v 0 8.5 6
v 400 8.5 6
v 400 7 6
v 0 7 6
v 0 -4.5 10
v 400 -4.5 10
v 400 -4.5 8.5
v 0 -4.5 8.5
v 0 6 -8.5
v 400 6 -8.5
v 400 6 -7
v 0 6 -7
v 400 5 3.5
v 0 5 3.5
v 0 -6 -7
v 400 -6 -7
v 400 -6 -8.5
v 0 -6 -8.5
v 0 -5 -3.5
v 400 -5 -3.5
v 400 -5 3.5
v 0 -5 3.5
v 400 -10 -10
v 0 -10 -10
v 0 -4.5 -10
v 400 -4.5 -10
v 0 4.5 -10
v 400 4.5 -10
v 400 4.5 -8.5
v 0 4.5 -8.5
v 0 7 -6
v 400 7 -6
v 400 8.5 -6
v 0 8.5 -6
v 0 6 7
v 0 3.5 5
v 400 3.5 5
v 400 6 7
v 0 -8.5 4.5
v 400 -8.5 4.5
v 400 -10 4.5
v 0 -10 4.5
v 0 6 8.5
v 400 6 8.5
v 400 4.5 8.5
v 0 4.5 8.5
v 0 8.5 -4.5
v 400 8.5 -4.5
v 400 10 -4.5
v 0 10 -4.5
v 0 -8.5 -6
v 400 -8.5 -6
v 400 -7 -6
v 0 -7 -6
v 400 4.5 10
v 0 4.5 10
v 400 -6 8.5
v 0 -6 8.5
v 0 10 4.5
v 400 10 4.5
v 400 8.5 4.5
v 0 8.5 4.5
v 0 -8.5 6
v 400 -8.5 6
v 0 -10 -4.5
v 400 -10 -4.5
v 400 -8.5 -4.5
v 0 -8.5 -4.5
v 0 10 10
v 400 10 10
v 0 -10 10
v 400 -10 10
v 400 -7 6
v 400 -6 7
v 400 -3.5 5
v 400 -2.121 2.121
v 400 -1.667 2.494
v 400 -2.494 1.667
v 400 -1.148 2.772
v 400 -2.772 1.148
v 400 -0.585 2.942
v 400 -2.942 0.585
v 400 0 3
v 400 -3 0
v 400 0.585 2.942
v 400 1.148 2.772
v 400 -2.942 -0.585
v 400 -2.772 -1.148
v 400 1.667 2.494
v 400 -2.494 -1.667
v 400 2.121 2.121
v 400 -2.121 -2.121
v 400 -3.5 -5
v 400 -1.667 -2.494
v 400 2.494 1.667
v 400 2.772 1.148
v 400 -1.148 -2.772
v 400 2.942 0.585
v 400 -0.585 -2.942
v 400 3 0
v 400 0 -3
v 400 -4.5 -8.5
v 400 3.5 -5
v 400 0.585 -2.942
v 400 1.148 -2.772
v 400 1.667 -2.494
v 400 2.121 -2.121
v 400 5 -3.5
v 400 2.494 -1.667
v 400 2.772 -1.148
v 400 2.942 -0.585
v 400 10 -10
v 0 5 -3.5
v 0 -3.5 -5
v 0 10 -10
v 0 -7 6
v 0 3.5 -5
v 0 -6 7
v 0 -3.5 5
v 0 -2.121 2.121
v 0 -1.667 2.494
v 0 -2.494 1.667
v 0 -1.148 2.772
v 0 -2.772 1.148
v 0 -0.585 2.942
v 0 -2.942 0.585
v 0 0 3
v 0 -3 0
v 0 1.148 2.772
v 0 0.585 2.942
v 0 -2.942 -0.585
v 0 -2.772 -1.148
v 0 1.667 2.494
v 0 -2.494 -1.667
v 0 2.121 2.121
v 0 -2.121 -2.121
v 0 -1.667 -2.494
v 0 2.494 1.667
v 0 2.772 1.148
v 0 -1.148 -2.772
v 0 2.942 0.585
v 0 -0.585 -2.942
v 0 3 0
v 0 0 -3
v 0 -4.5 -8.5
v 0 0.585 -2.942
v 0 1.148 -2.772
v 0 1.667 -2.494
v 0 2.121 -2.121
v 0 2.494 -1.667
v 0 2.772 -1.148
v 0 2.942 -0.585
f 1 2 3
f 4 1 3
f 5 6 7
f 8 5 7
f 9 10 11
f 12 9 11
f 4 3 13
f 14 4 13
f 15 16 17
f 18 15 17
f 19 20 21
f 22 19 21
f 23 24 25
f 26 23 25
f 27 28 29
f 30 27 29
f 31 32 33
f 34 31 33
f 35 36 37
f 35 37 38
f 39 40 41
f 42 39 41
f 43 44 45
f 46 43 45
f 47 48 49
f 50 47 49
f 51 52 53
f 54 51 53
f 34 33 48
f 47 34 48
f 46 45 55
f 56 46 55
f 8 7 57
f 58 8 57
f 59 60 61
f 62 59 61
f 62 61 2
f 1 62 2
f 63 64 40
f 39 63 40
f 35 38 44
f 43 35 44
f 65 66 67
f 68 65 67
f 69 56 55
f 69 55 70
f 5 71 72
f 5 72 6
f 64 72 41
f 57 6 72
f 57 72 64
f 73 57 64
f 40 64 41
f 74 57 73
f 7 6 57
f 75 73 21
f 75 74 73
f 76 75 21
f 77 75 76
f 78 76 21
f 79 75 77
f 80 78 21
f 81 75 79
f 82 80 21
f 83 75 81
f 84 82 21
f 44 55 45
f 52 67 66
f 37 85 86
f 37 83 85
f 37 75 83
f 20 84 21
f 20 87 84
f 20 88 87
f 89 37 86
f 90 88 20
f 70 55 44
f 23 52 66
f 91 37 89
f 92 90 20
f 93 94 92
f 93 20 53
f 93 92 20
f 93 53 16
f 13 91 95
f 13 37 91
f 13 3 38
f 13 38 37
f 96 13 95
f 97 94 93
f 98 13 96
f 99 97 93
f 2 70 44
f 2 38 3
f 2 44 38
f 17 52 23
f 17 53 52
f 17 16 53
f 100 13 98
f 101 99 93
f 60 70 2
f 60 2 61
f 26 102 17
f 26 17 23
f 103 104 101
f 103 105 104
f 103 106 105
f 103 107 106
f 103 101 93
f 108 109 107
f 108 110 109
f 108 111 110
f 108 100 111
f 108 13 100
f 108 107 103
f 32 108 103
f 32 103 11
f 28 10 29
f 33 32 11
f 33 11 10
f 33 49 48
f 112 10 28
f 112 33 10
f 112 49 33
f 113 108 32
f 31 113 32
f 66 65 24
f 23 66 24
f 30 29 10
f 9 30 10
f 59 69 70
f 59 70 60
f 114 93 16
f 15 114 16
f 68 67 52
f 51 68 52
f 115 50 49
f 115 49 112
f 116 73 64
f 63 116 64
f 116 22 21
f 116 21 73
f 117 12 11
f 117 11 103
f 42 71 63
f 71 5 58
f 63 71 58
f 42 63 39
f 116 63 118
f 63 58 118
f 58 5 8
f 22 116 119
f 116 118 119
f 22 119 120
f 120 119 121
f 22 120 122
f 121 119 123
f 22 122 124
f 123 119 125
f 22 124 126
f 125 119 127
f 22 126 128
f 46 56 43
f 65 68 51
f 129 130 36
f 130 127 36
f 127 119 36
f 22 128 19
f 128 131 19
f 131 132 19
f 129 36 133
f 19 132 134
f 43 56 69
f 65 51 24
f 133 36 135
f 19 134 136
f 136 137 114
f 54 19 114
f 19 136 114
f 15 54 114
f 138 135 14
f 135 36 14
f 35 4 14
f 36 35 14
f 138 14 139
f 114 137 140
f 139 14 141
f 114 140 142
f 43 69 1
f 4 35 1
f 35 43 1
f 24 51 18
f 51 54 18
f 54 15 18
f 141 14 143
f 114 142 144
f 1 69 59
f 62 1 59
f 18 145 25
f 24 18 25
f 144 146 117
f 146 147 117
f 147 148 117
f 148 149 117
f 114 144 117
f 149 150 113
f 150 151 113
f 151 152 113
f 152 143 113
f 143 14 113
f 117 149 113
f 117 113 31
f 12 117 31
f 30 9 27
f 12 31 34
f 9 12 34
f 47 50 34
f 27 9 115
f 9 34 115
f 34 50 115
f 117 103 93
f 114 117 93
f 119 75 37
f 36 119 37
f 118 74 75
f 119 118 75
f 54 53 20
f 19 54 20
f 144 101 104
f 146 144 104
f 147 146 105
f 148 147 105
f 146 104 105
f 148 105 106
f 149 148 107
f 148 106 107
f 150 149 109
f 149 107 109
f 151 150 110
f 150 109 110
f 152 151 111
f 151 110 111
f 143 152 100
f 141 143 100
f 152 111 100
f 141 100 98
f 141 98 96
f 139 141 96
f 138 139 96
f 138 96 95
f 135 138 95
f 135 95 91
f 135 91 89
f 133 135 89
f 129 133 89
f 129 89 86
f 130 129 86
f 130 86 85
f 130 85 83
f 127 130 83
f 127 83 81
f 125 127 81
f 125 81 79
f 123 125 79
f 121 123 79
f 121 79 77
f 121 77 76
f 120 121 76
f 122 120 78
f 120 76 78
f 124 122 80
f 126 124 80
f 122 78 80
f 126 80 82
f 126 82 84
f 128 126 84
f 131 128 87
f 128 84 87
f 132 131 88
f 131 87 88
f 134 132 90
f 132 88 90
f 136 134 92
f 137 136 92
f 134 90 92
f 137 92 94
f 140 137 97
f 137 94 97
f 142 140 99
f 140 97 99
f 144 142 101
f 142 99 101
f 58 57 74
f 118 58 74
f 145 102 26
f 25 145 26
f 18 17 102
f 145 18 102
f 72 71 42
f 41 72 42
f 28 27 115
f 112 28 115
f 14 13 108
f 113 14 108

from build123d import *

# Parameters (mm, degrees)
SKETCH1_W           = 20
SKETCH1_H           = 20
BOSS_EXTRUDE1_DEPTH = 400
SKETCH2_R           = 3
CUT_EXTRUDE1_DEPTH  = 401.249921924
CUT_EXTRUDE2_DEPTH  = 401.249921924
CIRPATTERN1_COUNT   = 4


with BuildPart() as part:
    # Sketch1 → Boss-Extrude1 (new body)
    with BuildSketch(Plane(origin=(0, 0, 0), x_dir=(0, 0, -1), z_dir=(1, 0, 0))):
        Rectangle(SKETCH1_W, SKETCH1_H)
    extrude(amount=BOSS_EXTRUDE1_DEPTH)

    # Sketch2 → Cut-Extrude1 (cut, through all)
    with BuildSketch(Plane(origin=(400, 0, 0), x_dir=(0, 0, -1), z_dir=(1, 0, 0))):
        Circle(SKETCH2_R)
    extrude(amount=-CUT_EXTRUDE1_DEPTH, mode=Mode.SUBTRACT)

    # Sketch2<3> → Cut-Extrude2 (cut, through all)
    with BuildSketch(Plane(origin=(400, 0, 0), x_dir=(0, 0, -1), z_dir=(1, 0, 0))):
        Polygon((-3.5, 5), (3.5, 5), (6, 7), (6, 8.5), (4.5, 8.5), (4.5, 10), (-4.5, 10), (-4.5, 8.5), (-6, 8.5), (-6, 7), align=None)
    cut_extrude2 = extrude(amount=-CUT_EXTRUDE2_DEPTH, mode=Mode.SUBTRACT)

    # CirPattern1: Cut-Extrude2 ×4 about axis
    cirpattern1_axis = Axis((0, 0, 0), (1, 0, 0))
    for i in range(1, CIRPATTERN1_COUNT):
        add(cut_extrude2.rotate(cirpattern1_axis, i * 360 / CIRPATTERN1_COUNT), mode=Mode.SUBTRACT)


solid = part.part
